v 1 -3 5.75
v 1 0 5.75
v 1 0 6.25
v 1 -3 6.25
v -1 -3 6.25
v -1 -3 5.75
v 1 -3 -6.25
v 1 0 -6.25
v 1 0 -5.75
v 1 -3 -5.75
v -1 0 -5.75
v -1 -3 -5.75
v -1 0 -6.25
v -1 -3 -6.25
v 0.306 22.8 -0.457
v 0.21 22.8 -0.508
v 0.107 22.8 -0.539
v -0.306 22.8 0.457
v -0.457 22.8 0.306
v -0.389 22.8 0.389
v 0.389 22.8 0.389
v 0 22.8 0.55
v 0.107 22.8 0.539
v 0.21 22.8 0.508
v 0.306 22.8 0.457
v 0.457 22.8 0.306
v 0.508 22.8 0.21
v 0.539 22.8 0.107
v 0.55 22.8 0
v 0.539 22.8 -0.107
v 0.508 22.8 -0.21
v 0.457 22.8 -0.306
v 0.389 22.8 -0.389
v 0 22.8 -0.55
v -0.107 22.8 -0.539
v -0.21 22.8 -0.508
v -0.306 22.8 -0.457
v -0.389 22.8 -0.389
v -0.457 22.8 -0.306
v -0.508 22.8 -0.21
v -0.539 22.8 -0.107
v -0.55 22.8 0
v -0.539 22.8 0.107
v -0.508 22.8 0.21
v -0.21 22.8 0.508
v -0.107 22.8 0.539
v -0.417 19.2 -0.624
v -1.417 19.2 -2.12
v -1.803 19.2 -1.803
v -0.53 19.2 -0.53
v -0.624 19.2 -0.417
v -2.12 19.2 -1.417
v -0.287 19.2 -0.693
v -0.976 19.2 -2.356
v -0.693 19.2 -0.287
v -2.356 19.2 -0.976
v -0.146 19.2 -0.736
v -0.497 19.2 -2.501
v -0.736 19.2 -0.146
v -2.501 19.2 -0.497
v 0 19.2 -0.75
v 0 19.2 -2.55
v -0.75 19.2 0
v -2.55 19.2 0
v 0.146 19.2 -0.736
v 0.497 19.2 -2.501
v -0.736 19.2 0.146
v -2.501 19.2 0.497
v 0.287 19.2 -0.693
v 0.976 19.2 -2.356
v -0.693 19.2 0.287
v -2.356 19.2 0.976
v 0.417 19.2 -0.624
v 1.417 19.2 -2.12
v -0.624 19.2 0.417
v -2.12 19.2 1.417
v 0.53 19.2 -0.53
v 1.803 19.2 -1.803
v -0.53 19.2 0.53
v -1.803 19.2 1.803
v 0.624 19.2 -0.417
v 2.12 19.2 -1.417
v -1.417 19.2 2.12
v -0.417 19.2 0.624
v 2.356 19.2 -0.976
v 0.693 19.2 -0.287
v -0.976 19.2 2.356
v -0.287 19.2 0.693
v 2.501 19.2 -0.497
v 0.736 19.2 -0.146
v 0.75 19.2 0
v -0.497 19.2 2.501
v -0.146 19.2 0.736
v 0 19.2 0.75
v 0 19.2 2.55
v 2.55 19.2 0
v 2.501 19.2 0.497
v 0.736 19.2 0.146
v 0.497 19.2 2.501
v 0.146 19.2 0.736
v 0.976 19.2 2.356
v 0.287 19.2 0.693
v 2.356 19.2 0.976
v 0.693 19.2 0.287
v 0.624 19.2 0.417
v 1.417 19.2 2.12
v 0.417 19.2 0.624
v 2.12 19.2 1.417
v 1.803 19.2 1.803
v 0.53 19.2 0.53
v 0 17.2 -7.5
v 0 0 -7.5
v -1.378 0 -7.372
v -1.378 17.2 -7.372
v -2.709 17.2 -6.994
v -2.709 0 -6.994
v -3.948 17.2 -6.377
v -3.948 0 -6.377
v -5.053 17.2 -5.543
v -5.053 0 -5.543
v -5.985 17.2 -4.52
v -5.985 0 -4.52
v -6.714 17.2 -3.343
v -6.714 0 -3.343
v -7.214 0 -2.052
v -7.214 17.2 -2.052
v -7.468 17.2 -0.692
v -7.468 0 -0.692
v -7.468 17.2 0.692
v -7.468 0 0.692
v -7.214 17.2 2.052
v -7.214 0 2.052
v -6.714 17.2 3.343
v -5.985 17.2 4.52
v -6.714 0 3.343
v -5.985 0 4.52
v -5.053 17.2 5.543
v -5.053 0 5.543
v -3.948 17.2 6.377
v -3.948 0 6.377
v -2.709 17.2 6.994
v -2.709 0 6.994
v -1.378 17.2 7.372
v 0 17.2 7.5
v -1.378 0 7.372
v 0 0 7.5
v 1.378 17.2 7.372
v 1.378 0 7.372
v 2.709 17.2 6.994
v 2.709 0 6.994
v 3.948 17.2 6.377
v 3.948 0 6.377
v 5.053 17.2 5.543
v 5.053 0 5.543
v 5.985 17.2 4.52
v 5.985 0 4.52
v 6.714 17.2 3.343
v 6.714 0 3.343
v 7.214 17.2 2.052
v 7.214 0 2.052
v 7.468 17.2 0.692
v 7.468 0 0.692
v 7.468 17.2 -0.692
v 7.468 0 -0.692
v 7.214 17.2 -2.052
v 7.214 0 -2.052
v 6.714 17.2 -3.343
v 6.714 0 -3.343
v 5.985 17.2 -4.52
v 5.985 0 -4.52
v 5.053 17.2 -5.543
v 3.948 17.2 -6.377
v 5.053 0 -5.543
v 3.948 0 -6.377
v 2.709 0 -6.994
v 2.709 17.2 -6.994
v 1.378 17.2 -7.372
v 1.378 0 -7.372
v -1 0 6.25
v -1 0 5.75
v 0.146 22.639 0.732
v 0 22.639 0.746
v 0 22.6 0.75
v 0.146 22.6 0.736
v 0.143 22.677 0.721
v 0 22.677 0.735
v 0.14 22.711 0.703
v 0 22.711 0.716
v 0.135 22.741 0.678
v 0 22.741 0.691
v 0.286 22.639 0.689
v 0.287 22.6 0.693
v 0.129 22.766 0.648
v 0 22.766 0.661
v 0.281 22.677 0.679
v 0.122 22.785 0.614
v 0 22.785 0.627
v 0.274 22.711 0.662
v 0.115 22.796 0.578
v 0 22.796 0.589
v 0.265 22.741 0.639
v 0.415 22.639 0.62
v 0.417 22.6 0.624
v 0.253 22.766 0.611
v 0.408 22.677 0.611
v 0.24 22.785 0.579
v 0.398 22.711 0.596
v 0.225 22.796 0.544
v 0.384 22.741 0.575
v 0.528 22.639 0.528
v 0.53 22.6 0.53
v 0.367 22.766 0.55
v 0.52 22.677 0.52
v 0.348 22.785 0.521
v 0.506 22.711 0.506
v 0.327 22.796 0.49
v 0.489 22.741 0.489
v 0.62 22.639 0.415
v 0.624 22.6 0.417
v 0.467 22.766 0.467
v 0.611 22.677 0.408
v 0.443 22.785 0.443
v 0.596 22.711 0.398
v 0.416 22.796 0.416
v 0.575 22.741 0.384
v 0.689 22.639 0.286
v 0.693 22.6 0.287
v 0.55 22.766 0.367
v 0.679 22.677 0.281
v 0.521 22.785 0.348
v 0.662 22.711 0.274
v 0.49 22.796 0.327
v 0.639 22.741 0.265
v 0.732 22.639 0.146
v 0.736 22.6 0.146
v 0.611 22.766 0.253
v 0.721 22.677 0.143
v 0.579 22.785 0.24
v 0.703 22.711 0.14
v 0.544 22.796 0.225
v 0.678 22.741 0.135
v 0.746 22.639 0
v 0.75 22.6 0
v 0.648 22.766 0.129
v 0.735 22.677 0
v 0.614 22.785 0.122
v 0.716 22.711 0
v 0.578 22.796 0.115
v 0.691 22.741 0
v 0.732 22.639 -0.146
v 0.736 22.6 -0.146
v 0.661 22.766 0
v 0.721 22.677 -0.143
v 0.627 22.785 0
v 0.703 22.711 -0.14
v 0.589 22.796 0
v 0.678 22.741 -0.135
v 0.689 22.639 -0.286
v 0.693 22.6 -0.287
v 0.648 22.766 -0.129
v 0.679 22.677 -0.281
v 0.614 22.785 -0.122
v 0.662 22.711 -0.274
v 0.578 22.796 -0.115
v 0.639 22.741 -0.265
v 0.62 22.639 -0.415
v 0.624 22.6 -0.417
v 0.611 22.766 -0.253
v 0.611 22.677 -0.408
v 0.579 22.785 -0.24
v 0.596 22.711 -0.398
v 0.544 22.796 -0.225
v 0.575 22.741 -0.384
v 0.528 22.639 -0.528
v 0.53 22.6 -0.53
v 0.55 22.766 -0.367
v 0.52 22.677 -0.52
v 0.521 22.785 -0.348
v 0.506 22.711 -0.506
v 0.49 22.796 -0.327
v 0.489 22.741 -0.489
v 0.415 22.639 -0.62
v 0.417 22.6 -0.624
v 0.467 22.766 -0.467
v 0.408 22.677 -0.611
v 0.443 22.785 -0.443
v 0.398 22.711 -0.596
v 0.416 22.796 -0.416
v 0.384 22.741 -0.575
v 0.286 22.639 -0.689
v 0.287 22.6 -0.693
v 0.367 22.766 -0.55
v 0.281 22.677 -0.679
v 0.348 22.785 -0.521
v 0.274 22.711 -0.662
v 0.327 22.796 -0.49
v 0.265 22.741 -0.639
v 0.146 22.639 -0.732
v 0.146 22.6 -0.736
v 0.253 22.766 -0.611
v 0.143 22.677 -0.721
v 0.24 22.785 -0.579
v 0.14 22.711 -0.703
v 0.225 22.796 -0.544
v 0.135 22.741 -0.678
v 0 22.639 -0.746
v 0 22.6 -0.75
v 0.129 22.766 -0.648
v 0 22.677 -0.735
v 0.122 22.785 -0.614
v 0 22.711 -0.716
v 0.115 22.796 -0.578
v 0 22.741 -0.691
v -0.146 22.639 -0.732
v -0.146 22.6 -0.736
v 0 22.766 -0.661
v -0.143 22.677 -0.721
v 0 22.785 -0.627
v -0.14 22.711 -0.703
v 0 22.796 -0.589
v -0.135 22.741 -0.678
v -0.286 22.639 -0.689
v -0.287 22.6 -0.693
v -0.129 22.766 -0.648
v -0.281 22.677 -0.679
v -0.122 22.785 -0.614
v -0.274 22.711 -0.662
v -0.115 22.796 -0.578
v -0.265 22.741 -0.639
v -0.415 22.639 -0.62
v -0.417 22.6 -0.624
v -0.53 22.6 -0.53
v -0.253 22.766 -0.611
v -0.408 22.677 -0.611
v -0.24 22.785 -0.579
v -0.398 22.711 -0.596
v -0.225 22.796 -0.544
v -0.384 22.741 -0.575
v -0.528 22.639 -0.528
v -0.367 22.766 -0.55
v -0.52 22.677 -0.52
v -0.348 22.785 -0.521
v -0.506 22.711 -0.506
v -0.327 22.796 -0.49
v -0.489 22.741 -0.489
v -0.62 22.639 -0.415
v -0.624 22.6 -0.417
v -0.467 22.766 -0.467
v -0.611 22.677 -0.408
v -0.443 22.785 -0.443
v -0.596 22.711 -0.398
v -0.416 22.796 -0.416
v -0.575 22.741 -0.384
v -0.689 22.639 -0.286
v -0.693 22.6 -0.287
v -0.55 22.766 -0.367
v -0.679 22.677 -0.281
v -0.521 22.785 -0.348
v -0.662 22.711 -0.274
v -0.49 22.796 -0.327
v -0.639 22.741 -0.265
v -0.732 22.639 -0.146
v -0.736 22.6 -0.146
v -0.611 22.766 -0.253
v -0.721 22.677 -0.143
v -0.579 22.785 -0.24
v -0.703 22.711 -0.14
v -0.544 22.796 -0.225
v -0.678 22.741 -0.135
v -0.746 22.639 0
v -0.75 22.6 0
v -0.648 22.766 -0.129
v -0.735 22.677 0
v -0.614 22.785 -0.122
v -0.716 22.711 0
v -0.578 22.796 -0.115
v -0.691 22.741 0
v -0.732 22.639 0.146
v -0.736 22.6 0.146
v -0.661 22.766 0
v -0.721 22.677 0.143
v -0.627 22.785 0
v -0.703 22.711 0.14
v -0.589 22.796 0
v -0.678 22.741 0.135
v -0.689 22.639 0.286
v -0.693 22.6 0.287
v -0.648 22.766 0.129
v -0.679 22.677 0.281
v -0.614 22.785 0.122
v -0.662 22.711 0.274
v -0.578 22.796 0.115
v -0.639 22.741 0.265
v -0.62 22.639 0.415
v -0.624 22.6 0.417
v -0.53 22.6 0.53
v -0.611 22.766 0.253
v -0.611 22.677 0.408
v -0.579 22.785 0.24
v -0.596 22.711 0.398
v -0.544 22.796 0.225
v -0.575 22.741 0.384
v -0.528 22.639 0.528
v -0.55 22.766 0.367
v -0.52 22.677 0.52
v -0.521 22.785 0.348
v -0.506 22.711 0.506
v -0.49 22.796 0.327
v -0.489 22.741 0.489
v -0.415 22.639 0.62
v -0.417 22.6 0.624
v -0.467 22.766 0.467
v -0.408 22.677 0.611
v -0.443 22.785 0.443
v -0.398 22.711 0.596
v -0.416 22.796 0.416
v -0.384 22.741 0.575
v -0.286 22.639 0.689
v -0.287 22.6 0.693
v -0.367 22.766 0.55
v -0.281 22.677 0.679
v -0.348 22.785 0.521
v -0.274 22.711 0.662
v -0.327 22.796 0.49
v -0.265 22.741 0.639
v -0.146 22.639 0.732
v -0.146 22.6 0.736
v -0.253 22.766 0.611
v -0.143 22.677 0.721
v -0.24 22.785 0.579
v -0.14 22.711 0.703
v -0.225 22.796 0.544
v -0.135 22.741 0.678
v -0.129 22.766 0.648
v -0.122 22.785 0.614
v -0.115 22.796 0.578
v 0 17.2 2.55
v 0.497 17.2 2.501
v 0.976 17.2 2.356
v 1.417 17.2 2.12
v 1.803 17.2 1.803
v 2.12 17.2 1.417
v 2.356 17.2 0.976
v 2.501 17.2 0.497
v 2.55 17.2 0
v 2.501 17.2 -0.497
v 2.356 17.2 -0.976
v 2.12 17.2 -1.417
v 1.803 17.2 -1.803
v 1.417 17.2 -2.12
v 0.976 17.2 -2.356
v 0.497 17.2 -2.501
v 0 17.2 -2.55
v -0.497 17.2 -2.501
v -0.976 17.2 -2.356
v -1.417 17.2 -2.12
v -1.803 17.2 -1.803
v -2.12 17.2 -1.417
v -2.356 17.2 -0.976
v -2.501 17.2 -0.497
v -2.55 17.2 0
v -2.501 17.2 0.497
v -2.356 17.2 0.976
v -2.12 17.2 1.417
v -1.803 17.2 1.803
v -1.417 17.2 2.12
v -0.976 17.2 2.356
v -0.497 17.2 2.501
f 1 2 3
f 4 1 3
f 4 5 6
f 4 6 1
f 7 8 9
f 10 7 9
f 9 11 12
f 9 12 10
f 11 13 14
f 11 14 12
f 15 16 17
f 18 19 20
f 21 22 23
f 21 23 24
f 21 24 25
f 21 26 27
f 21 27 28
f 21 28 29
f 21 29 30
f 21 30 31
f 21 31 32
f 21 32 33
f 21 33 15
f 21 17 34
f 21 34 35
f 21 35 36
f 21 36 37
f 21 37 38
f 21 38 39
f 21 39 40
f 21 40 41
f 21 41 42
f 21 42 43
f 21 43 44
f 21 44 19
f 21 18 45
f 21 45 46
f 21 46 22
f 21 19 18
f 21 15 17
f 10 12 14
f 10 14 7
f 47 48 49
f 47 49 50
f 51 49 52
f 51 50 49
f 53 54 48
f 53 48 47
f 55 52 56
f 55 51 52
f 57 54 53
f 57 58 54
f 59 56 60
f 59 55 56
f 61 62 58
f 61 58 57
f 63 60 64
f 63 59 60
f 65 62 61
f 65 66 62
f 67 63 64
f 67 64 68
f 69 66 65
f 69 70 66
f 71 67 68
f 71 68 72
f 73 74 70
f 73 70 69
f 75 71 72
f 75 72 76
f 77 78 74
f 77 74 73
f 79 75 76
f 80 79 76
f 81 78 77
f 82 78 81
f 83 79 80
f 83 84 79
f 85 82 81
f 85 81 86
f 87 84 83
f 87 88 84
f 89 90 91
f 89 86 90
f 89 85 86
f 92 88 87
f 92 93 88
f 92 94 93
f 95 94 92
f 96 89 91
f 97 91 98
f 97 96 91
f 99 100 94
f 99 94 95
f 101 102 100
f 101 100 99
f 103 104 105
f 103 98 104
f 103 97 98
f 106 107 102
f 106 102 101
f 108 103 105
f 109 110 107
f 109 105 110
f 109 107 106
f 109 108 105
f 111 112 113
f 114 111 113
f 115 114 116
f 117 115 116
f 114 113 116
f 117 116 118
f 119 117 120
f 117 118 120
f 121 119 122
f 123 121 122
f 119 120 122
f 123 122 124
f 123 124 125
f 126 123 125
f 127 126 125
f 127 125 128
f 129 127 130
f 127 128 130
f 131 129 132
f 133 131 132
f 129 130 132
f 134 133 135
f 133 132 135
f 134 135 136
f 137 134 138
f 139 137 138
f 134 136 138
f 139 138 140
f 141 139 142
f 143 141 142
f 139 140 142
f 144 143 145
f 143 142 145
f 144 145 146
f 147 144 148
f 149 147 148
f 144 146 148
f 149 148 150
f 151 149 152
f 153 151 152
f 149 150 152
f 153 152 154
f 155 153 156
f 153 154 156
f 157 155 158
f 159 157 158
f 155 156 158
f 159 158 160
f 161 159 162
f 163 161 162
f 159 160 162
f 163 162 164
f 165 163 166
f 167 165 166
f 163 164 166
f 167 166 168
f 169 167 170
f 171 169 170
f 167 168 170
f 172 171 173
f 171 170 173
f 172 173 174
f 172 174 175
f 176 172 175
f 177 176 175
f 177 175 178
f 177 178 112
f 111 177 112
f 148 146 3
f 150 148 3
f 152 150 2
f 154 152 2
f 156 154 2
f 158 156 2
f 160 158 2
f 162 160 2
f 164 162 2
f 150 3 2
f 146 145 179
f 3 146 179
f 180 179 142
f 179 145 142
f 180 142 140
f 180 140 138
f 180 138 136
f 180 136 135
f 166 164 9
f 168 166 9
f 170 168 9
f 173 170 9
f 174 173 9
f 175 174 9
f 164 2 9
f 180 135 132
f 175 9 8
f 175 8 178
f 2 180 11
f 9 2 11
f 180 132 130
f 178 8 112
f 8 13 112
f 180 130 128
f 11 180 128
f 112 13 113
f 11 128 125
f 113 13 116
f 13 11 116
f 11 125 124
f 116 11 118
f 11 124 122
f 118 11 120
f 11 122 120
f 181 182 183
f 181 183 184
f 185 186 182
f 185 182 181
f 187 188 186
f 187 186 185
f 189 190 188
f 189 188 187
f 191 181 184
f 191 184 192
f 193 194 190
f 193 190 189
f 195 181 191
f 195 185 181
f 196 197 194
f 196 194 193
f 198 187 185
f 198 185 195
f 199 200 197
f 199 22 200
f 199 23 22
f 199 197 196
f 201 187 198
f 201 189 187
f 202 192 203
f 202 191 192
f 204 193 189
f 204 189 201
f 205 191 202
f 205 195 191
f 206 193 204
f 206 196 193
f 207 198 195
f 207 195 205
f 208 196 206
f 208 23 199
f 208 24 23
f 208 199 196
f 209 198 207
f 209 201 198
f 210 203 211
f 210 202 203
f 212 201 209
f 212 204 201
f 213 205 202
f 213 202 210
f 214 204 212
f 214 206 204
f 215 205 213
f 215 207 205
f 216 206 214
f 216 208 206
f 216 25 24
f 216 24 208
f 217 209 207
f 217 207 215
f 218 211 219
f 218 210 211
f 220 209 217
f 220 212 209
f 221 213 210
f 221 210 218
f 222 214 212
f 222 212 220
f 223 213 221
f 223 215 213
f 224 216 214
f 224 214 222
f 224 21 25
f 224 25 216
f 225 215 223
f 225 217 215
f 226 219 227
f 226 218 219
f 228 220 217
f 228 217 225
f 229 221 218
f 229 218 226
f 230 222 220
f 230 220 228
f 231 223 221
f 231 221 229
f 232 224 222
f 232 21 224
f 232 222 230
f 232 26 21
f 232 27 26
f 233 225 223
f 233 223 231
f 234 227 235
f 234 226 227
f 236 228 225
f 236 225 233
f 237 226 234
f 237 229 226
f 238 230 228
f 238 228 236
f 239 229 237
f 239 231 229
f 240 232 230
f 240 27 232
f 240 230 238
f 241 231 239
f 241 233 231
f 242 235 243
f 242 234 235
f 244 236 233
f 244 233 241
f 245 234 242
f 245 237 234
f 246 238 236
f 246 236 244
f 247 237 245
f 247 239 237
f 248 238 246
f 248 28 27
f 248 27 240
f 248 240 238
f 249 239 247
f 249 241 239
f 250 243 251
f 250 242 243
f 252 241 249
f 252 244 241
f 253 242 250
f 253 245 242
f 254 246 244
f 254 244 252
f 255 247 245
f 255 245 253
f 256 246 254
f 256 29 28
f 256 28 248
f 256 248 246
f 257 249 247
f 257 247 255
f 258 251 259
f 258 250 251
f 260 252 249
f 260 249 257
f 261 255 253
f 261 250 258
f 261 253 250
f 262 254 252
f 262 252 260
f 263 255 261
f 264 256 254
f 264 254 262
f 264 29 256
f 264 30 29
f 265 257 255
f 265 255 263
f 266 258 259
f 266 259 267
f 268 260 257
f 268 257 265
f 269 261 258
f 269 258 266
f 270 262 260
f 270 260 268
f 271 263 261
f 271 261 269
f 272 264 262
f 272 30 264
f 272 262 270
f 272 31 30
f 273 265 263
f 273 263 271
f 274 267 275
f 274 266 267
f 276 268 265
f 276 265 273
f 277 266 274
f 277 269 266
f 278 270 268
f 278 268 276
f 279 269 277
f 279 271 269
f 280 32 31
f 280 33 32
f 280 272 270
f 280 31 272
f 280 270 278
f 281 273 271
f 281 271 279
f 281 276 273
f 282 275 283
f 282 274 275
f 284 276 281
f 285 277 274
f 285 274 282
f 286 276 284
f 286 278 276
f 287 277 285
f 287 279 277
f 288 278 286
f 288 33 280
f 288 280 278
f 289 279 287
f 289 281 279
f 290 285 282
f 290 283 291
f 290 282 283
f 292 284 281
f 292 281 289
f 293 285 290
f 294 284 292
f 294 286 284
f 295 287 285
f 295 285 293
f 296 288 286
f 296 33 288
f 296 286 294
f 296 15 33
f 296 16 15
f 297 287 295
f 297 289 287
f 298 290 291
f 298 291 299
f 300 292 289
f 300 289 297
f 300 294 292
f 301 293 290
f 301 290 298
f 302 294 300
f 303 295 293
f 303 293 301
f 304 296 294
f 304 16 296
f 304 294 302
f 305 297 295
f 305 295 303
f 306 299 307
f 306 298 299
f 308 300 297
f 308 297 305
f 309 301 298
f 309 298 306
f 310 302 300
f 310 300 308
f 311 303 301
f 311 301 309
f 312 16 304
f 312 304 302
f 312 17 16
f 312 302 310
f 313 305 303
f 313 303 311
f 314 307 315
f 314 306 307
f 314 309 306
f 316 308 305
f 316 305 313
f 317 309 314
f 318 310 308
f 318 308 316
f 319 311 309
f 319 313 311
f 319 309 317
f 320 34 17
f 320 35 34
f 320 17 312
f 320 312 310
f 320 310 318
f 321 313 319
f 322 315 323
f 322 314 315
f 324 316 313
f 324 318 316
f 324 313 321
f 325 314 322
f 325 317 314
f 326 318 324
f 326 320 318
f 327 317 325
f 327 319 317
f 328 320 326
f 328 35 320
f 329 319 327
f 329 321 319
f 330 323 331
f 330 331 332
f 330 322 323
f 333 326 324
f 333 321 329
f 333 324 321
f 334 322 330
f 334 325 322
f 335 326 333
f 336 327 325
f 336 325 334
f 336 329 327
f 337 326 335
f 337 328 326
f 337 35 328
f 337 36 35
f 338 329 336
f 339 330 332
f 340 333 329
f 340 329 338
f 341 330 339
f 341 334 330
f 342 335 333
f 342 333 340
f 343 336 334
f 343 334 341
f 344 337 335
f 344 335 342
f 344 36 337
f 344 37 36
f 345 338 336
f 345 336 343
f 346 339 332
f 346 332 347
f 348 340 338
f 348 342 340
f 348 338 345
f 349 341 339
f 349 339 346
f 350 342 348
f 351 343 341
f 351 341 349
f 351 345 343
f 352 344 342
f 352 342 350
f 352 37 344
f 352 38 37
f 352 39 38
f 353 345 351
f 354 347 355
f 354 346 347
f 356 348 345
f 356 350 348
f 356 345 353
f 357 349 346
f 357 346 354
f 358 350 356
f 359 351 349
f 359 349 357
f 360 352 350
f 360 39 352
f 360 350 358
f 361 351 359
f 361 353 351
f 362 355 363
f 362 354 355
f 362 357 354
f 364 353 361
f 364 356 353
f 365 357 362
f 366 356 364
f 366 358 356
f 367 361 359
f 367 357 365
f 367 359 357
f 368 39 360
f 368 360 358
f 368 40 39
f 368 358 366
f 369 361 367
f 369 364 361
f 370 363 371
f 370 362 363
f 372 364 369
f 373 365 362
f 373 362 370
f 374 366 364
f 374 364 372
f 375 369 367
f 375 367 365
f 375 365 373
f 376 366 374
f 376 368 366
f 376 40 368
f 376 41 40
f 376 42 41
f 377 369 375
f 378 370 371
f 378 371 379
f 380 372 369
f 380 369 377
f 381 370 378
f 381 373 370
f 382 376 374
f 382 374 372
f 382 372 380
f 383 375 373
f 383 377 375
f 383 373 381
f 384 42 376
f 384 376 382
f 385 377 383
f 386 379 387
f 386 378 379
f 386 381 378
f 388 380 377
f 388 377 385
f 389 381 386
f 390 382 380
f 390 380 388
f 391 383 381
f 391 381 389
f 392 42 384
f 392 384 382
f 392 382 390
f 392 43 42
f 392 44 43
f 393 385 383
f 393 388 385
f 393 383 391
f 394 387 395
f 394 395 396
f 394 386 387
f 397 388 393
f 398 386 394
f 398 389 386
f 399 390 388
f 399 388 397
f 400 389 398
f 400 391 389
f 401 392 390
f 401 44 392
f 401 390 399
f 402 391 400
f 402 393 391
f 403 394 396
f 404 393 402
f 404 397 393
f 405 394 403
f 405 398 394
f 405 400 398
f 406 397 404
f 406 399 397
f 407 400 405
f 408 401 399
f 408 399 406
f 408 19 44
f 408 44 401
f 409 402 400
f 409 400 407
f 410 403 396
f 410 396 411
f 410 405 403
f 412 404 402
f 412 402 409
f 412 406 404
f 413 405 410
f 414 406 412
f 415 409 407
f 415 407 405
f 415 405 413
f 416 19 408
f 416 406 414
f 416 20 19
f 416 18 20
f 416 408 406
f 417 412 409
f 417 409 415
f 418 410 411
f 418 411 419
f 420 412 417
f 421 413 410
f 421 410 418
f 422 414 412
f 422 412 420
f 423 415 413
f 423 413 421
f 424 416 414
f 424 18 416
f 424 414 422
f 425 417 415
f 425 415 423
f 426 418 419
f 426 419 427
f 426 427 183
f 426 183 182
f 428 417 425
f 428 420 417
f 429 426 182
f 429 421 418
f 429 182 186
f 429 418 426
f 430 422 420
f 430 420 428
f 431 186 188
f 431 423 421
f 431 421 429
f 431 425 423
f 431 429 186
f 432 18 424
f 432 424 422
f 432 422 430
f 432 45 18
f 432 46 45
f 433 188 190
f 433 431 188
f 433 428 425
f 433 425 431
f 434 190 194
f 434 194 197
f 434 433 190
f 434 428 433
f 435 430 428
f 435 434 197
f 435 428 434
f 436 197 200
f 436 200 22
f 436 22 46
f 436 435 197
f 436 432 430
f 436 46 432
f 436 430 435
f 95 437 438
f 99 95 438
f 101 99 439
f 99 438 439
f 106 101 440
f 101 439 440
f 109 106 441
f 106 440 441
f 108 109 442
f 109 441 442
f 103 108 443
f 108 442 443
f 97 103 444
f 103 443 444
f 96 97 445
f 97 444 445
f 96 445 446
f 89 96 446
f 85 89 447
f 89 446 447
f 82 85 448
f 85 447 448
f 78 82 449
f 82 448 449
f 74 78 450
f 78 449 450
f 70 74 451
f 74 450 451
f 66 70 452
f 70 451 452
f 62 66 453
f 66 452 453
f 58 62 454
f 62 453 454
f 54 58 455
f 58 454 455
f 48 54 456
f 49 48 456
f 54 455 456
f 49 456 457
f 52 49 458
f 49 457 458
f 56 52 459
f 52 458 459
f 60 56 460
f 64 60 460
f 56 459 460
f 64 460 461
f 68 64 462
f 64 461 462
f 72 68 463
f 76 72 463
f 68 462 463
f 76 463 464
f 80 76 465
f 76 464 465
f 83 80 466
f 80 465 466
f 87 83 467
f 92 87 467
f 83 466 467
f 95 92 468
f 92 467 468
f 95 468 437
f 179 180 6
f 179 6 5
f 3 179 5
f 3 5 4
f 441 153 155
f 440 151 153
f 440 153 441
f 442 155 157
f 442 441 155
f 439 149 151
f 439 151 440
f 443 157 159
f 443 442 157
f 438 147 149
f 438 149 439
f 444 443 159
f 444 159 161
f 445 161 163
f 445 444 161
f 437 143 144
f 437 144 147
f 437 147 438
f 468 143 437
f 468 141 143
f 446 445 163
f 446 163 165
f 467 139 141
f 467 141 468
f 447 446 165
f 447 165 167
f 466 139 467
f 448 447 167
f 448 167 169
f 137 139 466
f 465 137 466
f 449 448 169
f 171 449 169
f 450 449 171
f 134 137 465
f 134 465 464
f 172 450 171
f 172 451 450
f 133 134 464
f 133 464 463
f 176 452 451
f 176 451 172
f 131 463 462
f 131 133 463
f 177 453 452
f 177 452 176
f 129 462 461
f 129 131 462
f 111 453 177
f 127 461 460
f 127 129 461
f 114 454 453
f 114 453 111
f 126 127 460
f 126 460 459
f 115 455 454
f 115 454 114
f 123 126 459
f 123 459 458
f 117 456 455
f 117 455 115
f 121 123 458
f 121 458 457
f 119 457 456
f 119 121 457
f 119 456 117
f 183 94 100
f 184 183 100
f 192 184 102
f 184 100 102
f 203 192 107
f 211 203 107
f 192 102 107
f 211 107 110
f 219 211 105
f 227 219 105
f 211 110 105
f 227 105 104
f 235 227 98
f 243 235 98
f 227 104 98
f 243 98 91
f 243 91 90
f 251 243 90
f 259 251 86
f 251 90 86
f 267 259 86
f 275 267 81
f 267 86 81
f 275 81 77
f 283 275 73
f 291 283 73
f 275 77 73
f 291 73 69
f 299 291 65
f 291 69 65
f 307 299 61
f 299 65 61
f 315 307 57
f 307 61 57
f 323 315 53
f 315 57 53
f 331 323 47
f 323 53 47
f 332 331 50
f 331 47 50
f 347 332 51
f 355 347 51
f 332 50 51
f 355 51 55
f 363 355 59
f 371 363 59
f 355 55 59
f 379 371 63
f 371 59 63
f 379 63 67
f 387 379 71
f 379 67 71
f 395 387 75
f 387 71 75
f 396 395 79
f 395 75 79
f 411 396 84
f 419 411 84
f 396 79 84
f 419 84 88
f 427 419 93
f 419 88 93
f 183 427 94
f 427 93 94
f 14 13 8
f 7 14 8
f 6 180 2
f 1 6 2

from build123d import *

# Parameters (mm, degrees)
SKETCH_1_R      = 7.5
EXTRUDE_1_DEPTH = 17.2
SKETCH_2_R      = 2.55
EXTRUDE_2_DEPTH = 2
SKETCH_3_R      = 0.75
EXTRUDE_3_DEPTH = 3.6
SKETCH_4_W      = 2
SKETCH_4_H      = 0.5
EXTRUDE_4_DEPTH = 3
FILLET_2_R      = 0.2


with BuildPart() as part:
    # 草圖1 → 伸長1 (new body)
    with BuildSketch(Plane(origin=(0, 0, 0), x_dir=(1, 0, 0), z_dir=(0, 1, 0))):
        with Locations(Location((0, 0, 0), (0, 0, 90))):
            Circle(SKETCH_1_R)
    extrude(amount=EXTRUDE_1_DEPTH)

    # 草圖2 → 伸長2 (add)
    with BuildSketch(Plane(origin=(0, 17.2, 0), x_dir=(1, 0, 0), z_dir=(0, 1, 0))):
        with Locations(Location((0, 0, 0), (0, 0, 270))):
            Circle(SKETCH_2_R)
    extrude(amount=EXTRUDE_2_DEPTH)

    # 草圖3 → 伸長3 (add)
    with BuildSketch(Plane(origin=(0, 19.2, 0), x_dir=(-1, 0, 0), z_dir=(0, 1, 0))):
        with Locations(Location((0, 0, 0), (0, 0, 90))):
            Circle(SKETCH_3_R)
    extrude(amount=EXTRUDE_3_DEPTH)

    # 草圖4 → 伸長4 (add)
    with BuildSketch(Plane.XZ):
        with Locations((0, 6)):
            Rectangle(SKETCH_4_W, SKETCH_4_H)
        with Locations((0, -6)):
            Rectangle(SKETCH_4_W, SKETCH_4_H)
    extrude(amount=EXTRUDE_4_DEPTH)

    # 圓角2
    fillet_2_edges = [part.edges().sort_by_distance(p)[0] for p in [
        (0, 22.8, -0.75),
    ]]
    fillet(fillet_2_edges, radius=FILLET_2_R)


solid = part.part
